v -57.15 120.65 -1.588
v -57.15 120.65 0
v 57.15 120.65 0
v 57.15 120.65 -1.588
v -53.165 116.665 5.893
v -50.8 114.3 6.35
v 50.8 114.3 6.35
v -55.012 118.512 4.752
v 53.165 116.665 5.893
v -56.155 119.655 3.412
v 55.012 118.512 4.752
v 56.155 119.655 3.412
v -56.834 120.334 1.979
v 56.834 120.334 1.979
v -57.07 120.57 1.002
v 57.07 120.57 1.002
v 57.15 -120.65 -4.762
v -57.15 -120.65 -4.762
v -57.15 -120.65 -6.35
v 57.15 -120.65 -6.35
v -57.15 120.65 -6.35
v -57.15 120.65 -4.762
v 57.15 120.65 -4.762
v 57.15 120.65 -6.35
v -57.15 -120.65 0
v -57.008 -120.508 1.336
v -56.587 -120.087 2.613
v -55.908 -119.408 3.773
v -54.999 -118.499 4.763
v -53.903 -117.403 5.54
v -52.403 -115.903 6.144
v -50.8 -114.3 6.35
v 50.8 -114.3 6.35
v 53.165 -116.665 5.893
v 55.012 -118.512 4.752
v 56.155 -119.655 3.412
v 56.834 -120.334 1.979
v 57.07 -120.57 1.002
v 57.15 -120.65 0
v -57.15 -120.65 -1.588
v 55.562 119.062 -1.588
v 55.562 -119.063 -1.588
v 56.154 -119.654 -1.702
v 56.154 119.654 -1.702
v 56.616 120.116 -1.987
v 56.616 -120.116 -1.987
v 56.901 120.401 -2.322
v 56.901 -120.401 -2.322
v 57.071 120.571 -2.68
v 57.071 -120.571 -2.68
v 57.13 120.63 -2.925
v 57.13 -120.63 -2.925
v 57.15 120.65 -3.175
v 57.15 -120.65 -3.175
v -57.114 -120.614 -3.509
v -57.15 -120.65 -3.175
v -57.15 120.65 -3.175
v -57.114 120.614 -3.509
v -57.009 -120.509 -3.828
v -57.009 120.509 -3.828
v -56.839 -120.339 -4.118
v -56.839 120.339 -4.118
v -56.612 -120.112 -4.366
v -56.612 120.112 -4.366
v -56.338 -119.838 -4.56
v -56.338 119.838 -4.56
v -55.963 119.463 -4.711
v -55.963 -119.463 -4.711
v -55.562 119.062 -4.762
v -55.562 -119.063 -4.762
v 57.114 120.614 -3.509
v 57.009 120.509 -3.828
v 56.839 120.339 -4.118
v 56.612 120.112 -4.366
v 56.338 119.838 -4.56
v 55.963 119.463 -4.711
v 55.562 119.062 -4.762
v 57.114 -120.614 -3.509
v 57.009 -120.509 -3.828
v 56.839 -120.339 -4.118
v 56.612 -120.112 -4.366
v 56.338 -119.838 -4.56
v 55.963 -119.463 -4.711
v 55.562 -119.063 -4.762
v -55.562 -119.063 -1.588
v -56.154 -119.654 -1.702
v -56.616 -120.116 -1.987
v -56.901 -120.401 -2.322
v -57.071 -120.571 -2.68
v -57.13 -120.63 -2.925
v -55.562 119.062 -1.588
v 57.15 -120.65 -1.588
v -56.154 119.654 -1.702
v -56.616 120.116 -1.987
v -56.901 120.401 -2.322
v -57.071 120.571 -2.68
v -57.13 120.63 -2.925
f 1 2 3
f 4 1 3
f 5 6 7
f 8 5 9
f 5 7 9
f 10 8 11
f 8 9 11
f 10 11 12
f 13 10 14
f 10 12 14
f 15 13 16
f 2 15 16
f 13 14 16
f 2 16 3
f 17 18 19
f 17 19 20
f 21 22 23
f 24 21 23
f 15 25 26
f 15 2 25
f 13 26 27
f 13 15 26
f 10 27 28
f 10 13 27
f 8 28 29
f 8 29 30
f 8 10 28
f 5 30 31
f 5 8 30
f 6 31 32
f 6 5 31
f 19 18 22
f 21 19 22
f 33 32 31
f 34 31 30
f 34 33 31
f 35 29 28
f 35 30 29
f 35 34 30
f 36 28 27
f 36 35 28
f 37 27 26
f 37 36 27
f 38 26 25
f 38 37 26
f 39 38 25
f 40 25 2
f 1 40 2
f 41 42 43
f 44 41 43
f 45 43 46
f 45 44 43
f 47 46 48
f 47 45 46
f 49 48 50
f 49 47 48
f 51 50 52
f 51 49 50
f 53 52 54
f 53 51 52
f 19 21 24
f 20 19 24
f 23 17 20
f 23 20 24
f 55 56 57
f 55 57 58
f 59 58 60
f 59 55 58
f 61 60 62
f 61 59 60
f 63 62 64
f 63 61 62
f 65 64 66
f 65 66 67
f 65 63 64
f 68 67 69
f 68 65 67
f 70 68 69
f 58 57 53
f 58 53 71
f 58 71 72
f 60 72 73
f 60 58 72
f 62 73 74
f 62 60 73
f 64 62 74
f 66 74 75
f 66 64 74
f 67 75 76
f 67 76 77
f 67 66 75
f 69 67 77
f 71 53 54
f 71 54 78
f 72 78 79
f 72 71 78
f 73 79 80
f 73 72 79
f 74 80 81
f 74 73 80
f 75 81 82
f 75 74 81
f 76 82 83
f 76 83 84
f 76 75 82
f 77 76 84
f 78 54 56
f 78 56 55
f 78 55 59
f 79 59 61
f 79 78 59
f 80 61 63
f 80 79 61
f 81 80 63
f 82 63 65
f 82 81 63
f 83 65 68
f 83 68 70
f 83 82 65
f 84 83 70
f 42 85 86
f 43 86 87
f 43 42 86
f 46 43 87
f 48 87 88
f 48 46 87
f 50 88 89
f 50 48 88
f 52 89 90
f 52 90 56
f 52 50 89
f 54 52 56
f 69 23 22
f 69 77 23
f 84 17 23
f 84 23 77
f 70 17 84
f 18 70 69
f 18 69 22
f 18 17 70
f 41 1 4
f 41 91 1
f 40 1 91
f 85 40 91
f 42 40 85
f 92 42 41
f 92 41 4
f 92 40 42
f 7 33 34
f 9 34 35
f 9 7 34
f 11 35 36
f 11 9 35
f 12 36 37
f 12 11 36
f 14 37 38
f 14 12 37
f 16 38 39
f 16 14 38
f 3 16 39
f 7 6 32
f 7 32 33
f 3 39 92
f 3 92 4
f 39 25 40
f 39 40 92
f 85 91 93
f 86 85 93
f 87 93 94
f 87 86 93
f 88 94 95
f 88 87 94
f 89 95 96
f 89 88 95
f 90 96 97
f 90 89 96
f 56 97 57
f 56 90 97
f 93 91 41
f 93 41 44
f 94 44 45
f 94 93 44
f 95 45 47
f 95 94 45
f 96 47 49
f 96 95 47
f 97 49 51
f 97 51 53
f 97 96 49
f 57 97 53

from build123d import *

# Parameters (mm, degrees)
F0_W     = 114.3
F0_H     = 241.3
F1_DEPTH = 6.35
F2_R     = 6.35


with BuildPart() as f1:
    # F0 (on Top) → F1 (new body, symmetric)
    with BuildSketch(Plane.XY):
        Rectangle(F0_W, F0_H)
    extrude(amount=F1_DEPTH, both=True)

    # F2
    f2_edges = [f1.edges().sort_by_distance(p)[0] for p in [
        (0, 120.65, 6.35),
        (-57.15, 0, 6.35),
        (0, -120.65, 6.35),
        (57.15, 0, 6.35),
    ]]
    fillet(f2_edges, radius=F2_R)

    # F4: sweep along a path in F4_path
    with BuildLine(Plane(origin=(57.15, -120.65, -6.35), x_dir=(0, -1, 0), z_dir=(0, 0, -1))) as f4_path:
        Line((0, 0), (-241.3, 0))
        Line((-241.3, 0), (-241.3, 114.3))
        Line((-241.3, 114.3), (0, 114.3))
        Line((0, 114.3), (0, 0))
    # F3 (on face) → F4 (sweep, cut)
    with BuildSketch(Plane.XZ.offset(120.65)):
        with BuildLine():
            ThreePointArc((55.5625, -1.5875), (56.6850320151, -2.0524679849), (57.15, -3.175))
            Line((57.15, -3.175), (57.15, -1.5875))
            Line((57.15, -1.5875), (55.5625, -1.5875))
        make_face()
        with BuildLine():
            ThreePointArc((57.15, -3.175), (56.6850320151, -4.2975320151), (55.5625, -4.7625))
            Line((55.5625, -4.7625), (57.15, -4.7625))
            Line((57.15, -4.7625), (57.15, -3.175))
        make_face()
    sweep(path=f4_path.line, transition=Transition.RIGHT, mode=Mode.SUBTRACT)


solid = f1.part
